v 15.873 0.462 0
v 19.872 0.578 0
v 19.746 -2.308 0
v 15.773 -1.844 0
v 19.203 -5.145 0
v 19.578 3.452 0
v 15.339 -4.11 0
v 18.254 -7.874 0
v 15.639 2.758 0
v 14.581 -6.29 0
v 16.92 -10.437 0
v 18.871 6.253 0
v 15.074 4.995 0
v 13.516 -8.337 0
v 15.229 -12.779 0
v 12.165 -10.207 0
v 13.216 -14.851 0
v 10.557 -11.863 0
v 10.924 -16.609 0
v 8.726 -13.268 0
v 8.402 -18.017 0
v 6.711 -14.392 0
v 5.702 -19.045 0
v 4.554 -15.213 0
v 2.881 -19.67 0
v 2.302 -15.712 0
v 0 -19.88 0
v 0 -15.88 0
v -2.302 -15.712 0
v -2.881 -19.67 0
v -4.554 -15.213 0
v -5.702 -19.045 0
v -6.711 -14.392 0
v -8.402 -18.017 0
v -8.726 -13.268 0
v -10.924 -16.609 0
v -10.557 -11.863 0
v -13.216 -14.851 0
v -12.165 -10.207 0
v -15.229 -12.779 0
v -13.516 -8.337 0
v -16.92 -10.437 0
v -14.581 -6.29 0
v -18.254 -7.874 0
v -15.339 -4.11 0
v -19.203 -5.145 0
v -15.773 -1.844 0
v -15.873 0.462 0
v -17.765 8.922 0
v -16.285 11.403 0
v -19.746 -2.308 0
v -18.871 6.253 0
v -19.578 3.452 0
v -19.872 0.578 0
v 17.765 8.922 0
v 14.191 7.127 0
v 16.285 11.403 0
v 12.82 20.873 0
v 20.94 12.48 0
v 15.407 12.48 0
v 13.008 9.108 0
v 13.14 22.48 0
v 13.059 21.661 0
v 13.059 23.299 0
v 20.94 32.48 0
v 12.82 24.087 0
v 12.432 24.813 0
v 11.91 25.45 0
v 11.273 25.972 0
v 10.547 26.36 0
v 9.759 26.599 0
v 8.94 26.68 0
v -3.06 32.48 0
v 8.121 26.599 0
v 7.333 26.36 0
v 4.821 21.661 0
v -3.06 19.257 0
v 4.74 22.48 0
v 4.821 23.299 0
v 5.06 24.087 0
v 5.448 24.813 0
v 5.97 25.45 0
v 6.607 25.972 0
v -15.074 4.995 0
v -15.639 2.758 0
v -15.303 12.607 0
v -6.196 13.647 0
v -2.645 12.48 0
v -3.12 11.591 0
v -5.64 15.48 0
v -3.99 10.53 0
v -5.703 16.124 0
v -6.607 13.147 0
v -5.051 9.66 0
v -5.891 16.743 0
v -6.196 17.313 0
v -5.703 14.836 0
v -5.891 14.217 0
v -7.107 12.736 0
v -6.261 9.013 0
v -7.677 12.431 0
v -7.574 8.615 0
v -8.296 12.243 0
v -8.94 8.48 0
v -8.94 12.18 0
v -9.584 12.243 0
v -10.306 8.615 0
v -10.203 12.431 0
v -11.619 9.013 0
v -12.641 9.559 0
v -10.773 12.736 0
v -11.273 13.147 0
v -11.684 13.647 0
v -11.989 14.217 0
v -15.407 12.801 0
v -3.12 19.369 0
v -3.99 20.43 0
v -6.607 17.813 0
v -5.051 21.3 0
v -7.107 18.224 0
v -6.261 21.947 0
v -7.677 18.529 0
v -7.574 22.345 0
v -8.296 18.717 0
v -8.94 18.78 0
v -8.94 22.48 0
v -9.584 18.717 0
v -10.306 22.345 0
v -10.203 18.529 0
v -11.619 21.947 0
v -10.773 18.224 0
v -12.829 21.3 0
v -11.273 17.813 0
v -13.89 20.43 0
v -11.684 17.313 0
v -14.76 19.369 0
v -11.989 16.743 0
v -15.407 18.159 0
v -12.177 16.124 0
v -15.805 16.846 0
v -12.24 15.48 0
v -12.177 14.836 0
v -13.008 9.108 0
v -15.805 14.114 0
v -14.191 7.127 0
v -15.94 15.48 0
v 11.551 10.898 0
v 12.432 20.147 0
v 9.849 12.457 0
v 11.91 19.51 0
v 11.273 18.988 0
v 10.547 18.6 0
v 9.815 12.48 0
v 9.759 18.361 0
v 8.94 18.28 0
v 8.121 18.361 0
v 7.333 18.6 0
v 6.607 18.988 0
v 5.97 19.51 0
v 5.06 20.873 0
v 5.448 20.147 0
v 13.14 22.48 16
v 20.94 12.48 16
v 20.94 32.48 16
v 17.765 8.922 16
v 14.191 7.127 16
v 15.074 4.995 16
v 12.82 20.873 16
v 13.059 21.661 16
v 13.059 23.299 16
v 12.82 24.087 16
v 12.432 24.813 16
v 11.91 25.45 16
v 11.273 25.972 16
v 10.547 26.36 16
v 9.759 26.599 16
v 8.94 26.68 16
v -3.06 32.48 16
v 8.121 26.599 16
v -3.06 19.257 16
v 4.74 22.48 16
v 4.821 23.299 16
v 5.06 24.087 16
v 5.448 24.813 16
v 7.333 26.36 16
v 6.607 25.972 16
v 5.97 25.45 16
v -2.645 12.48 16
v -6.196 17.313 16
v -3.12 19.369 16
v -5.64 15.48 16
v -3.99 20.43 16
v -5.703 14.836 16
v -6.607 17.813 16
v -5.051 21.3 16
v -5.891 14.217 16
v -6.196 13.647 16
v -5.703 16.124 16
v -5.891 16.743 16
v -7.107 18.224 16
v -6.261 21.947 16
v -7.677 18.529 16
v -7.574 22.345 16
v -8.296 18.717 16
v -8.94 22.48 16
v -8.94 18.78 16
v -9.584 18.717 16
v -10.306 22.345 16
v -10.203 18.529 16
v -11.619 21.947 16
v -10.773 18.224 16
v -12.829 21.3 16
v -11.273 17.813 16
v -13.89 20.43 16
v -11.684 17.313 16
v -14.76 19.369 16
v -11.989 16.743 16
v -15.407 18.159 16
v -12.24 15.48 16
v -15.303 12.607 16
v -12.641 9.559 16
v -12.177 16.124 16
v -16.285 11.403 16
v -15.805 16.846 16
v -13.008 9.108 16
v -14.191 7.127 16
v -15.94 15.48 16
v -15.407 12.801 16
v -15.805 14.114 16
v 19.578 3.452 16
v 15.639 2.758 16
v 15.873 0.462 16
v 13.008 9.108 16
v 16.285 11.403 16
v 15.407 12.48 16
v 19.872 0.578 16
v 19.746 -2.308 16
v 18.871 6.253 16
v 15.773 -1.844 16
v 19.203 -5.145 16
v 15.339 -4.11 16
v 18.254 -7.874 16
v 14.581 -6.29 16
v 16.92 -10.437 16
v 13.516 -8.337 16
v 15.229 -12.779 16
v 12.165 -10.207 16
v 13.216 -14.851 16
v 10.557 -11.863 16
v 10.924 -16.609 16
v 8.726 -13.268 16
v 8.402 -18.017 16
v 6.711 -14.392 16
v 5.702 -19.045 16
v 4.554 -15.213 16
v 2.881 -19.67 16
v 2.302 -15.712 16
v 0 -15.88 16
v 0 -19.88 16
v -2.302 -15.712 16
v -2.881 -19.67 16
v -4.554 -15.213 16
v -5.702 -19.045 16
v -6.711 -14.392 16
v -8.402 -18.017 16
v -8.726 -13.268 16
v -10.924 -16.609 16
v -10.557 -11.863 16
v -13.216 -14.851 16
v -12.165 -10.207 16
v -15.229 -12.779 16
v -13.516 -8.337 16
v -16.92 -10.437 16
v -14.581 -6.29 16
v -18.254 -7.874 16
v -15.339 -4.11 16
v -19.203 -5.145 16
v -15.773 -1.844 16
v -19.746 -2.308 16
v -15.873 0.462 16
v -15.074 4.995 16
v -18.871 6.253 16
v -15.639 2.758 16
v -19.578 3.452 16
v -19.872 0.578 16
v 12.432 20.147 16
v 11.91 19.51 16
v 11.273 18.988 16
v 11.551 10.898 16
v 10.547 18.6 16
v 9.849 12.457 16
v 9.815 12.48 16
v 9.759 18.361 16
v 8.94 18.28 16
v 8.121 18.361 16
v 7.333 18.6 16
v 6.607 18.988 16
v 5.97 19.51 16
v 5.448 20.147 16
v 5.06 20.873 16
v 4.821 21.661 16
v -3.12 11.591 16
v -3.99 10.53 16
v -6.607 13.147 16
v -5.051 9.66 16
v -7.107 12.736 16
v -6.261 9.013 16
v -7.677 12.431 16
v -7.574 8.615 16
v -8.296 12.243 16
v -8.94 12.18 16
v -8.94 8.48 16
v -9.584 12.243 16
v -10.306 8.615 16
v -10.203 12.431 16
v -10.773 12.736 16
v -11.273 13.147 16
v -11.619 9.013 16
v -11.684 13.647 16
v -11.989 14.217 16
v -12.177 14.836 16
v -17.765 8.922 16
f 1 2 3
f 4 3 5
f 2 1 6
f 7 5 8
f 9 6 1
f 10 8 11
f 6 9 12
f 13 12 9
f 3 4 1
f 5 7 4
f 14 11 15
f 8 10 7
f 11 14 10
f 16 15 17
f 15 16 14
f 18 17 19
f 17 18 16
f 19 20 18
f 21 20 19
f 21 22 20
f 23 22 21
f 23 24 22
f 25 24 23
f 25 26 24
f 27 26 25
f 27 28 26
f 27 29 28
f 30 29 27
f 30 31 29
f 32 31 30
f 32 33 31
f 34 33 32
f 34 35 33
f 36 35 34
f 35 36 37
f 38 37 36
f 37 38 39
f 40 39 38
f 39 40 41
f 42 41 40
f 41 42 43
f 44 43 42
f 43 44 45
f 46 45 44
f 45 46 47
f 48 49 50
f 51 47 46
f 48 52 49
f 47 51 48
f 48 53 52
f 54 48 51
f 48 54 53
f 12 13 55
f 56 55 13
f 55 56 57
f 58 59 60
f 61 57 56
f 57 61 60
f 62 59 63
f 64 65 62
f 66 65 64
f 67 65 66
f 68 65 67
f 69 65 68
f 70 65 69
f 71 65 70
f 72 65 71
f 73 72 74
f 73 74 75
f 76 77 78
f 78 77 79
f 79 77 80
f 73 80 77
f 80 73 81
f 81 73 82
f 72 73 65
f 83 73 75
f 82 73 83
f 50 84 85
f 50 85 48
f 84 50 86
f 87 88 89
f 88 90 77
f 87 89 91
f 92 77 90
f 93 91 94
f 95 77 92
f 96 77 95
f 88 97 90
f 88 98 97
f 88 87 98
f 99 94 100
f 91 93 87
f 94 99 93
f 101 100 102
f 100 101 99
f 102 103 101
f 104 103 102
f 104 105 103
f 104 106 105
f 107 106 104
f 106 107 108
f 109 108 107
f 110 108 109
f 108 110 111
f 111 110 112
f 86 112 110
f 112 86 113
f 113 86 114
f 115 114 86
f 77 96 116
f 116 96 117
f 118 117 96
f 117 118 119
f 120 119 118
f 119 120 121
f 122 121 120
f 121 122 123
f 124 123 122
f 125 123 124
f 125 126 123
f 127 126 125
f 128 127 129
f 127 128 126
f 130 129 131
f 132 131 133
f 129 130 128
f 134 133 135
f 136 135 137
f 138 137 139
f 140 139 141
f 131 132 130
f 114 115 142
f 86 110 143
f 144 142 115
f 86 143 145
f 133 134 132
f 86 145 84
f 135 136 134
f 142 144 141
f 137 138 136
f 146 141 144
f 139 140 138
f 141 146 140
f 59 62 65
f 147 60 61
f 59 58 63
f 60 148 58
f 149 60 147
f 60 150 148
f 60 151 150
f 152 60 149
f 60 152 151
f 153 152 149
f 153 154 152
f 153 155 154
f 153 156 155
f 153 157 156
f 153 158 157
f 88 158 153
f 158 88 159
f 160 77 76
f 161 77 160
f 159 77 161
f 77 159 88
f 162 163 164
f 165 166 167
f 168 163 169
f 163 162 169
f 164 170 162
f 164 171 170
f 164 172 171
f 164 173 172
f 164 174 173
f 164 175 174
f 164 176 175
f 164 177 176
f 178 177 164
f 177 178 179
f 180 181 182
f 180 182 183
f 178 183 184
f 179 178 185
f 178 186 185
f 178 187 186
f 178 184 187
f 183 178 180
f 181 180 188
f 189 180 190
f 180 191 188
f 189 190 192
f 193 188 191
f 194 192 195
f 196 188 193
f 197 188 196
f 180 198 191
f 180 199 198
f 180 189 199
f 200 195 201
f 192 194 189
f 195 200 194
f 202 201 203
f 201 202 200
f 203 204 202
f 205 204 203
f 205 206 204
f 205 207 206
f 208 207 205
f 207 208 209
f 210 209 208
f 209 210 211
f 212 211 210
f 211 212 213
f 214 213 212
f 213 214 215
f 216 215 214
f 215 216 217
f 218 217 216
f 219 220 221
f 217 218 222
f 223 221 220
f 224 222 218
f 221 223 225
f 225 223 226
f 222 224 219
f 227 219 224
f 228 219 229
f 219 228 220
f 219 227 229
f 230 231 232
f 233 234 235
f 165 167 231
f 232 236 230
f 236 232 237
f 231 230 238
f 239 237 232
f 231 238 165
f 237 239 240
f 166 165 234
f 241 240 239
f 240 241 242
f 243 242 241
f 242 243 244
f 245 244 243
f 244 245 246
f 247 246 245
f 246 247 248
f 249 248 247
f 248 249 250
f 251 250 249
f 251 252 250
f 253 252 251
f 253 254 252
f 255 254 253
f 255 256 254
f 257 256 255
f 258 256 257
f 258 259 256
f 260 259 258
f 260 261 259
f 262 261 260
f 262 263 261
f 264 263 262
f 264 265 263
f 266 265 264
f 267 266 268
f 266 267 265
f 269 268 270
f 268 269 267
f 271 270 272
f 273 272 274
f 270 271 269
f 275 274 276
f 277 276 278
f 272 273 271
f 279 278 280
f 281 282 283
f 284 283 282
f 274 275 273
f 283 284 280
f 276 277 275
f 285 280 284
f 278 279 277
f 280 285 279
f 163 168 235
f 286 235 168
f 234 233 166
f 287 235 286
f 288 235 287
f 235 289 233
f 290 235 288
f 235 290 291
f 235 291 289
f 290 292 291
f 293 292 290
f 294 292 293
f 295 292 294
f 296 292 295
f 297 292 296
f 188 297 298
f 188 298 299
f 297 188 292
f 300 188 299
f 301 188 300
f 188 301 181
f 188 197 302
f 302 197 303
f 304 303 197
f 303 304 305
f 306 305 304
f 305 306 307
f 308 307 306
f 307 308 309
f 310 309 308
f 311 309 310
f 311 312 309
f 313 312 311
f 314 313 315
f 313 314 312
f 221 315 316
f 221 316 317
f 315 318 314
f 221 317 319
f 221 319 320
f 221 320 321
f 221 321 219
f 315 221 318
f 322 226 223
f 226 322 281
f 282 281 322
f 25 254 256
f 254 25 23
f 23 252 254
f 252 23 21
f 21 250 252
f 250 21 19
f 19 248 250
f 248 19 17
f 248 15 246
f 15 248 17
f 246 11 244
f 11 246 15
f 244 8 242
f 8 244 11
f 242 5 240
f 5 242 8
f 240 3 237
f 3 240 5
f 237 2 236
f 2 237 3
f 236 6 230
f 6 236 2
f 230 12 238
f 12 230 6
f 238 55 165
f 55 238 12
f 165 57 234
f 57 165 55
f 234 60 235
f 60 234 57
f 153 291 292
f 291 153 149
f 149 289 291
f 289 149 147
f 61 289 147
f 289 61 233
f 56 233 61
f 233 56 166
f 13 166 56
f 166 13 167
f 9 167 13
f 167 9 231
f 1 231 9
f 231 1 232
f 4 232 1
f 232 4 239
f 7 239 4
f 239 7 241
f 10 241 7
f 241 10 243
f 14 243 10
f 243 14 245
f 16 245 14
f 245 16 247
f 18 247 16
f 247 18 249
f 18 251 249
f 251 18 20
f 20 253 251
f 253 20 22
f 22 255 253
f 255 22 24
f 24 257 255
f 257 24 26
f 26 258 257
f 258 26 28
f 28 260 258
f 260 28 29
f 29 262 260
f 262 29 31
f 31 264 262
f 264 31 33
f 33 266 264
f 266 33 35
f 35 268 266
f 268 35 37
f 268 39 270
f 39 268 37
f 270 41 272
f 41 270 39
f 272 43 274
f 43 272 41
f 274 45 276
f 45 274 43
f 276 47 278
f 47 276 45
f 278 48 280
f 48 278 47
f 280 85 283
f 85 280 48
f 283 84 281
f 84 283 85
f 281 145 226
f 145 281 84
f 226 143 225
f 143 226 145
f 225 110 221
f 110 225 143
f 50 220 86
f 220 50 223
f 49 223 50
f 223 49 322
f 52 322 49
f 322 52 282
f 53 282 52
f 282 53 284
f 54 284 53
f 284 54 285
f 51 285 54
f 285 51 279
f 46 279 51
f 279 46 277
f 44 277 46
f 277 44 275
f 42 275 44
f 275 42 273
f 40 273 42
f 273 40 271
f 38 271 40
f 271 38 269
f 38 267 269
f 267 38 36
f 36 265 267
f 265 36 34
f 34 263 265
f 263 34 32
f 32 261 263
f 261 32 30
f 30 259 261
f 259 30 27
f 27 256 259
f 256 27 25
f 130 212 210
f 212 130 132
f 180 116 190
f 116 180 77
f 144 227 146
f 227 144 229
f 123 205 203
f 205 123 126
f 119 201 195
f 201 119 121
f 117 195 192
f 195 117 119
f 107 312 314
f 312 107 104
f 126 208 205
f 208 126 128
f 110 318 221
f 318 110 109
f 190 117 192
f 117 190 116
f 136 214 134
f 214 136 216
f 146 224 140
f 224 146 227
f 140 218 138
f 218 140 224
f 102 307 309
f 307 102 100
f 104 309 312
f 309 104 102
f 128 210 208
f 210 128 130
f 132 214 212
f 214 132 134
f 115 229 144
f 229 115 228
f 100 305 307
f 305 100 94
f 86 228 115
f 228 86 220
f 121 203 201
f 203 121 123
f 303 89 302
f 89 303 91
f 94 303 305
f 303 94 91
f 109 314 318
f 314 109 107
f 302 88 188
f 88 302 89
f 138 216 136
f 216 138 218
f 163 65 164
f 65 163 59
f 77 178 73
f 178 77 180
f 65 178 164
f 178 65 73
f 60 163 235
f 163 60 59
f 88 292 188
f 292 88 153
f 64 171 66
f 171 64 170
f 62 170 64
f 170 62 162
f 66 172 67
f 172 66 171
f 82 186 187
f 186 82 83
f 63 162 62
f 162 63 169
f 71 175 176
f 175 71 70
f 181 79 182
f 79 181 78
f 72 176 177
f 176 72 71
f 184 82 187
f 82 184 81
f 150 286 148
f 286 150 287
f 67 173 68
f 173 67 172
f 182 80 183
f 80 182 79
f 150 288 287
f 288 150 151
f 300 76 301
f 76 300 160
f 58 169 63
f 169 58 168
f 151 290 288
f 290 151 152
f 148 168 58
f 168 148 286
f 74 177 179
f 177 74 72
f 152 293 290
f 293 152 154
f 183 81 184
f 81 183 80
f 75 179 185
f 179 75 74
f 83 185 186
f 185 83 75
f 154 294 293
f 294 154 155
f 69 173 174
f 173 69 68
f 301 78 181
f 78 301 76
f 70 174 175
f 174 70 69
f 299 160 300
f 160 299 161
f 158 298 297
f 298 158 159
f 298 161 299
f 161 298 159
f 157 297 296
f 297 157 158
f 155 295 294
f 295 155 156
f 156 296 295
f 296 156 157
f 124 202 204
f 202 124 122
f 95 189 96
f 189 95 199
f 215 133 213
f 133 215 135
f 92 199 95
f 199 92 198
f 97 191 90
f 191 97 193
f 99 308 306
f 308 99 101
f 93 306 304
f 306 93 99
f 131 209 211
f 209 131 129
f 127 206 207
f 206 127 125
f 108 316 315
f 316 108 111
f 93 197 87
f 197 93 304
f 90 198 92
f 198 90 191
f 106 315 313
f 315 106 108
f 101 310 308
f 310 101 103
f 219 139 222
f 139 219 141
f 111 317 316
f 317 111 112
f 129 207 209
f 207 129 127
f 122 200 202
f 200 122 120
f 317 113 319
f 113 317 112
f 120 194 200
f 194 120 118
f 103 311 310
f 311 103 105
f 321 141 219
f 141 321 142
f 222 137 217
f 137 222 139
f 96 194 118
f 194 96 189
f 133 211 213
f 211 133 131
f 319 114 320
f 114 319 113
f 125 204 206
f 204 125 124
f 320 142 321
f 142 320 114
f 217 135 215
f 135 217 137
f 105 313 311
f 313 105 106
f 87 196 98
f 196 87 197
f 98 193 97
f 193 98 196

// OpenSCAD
$fn = 32;

// ----------------------------------------------------------------------
// Pipe clamp: 39.76 mm ring, 4 mm wall, 16 mm wide
// ----------------------------------------------------------------------

// --- parameters (mm) ---
outer_r = 19.88;          // clamp outside radius
inner_r = 15.88;          // pipe bore radius
band = 4;                 // band thickness
clamp_w = 16;             // clamp width
opening = 60;             // opening angle between the ends
lug_w = 24;               // lug width
lug_len = 20;             // lug length
bolt_d = 8.4;             // bolt hole
knuckle_d = 14;           // hinge knuckle diameter
pin_d = 6.6;              // hinge pin hole

clamp_profile = [[-9.94, 17.217], [-12.33, 15.594], [-14.46, 13.642], [-16.285, 11.403], [-17.765, 8.922], [-18.871, 6.253], [-19.578, 3.452], [-19.872, 0.578], [-19.746, -2.308], [-19.203, -5.145], [-18.254, -7.874], [-16.92, -10.437], [-15.229, -12.779], [-13.216, -14.851], [-10.924, -16.609], [-8.402, -18.017], [-5.702, -19.045], [-2.881, -19.67], [0, -19.88], [2.881, -19.67], [5.702, -19.045], [8.402, -18.017], [10.924, -16.609], [13.216, -14.851], [15.229, -12.779], [16.92, -10.437], [18.254, -7.874], [19.203, -5.145], [19.746, -2.308], [19.872, 0.578], [19.578, 3.452], [18.871, 6.253], [17.765, 8.922], [16.285, 11.403], [14.46, 13.642], [12.33, 15.594], [9.94, 17.217], [7.94, 13.752], [9.849, 12.457], [11.551, 10.898], [13.008, 9.108], [14.191, 7.127], [15.074, 4.995], [15.639, 2.758], [15.873, 0.462], [15.773, -1.844], [15.339, -4.11], [14.581, -6.29], [13.516, -8.337], [12.165, -10.207], [10.557, -11.863], [8.726, -13.268], [6.711, -14.392], [4.554, -15.213], [2.302, -15.712], [0, -15.88], [-2.302, -15.712], [-4.554, -15.213], [-6.711, -14.392], [-8.726, -13.268], [-10.557, -11.863], [-12.165, -10.207], [-13.516, -8.337], [-14.581, -6.29], [-15.339, -4.11], [-15.773, -1.844], [-15.873, 0.462], [-15.639, 2.758], [-15.074, 4.995], [-14.191, 7.127], [-13.008, 9.108], [-11.551, 10.898], [-9.849, 12.457], [-7.94, 13.752]];

difference() {
  union() {
    linear_extrude(height = clamp_w) polygon(clamp_profile);
    /* hinge knuckle, sunk 2 mm into the band end */
    translate([-8.94, 15.48, 0]) cylinder(h = clamp_w, d = knuckle_d);
    /* bolt lug on the other end */
    translate([-3.06, 12.48, 0]) cube([lug_w, 20, clamp_w]);
  }
  translate([8.94, 22.48, -2.5]) cylinder(h = clamp_w + 5, d = bolt_d);
  translate([-8.94, 15.48, -2.5]) cylinder(h = clamp_w + 5, d = pin_d);
}
